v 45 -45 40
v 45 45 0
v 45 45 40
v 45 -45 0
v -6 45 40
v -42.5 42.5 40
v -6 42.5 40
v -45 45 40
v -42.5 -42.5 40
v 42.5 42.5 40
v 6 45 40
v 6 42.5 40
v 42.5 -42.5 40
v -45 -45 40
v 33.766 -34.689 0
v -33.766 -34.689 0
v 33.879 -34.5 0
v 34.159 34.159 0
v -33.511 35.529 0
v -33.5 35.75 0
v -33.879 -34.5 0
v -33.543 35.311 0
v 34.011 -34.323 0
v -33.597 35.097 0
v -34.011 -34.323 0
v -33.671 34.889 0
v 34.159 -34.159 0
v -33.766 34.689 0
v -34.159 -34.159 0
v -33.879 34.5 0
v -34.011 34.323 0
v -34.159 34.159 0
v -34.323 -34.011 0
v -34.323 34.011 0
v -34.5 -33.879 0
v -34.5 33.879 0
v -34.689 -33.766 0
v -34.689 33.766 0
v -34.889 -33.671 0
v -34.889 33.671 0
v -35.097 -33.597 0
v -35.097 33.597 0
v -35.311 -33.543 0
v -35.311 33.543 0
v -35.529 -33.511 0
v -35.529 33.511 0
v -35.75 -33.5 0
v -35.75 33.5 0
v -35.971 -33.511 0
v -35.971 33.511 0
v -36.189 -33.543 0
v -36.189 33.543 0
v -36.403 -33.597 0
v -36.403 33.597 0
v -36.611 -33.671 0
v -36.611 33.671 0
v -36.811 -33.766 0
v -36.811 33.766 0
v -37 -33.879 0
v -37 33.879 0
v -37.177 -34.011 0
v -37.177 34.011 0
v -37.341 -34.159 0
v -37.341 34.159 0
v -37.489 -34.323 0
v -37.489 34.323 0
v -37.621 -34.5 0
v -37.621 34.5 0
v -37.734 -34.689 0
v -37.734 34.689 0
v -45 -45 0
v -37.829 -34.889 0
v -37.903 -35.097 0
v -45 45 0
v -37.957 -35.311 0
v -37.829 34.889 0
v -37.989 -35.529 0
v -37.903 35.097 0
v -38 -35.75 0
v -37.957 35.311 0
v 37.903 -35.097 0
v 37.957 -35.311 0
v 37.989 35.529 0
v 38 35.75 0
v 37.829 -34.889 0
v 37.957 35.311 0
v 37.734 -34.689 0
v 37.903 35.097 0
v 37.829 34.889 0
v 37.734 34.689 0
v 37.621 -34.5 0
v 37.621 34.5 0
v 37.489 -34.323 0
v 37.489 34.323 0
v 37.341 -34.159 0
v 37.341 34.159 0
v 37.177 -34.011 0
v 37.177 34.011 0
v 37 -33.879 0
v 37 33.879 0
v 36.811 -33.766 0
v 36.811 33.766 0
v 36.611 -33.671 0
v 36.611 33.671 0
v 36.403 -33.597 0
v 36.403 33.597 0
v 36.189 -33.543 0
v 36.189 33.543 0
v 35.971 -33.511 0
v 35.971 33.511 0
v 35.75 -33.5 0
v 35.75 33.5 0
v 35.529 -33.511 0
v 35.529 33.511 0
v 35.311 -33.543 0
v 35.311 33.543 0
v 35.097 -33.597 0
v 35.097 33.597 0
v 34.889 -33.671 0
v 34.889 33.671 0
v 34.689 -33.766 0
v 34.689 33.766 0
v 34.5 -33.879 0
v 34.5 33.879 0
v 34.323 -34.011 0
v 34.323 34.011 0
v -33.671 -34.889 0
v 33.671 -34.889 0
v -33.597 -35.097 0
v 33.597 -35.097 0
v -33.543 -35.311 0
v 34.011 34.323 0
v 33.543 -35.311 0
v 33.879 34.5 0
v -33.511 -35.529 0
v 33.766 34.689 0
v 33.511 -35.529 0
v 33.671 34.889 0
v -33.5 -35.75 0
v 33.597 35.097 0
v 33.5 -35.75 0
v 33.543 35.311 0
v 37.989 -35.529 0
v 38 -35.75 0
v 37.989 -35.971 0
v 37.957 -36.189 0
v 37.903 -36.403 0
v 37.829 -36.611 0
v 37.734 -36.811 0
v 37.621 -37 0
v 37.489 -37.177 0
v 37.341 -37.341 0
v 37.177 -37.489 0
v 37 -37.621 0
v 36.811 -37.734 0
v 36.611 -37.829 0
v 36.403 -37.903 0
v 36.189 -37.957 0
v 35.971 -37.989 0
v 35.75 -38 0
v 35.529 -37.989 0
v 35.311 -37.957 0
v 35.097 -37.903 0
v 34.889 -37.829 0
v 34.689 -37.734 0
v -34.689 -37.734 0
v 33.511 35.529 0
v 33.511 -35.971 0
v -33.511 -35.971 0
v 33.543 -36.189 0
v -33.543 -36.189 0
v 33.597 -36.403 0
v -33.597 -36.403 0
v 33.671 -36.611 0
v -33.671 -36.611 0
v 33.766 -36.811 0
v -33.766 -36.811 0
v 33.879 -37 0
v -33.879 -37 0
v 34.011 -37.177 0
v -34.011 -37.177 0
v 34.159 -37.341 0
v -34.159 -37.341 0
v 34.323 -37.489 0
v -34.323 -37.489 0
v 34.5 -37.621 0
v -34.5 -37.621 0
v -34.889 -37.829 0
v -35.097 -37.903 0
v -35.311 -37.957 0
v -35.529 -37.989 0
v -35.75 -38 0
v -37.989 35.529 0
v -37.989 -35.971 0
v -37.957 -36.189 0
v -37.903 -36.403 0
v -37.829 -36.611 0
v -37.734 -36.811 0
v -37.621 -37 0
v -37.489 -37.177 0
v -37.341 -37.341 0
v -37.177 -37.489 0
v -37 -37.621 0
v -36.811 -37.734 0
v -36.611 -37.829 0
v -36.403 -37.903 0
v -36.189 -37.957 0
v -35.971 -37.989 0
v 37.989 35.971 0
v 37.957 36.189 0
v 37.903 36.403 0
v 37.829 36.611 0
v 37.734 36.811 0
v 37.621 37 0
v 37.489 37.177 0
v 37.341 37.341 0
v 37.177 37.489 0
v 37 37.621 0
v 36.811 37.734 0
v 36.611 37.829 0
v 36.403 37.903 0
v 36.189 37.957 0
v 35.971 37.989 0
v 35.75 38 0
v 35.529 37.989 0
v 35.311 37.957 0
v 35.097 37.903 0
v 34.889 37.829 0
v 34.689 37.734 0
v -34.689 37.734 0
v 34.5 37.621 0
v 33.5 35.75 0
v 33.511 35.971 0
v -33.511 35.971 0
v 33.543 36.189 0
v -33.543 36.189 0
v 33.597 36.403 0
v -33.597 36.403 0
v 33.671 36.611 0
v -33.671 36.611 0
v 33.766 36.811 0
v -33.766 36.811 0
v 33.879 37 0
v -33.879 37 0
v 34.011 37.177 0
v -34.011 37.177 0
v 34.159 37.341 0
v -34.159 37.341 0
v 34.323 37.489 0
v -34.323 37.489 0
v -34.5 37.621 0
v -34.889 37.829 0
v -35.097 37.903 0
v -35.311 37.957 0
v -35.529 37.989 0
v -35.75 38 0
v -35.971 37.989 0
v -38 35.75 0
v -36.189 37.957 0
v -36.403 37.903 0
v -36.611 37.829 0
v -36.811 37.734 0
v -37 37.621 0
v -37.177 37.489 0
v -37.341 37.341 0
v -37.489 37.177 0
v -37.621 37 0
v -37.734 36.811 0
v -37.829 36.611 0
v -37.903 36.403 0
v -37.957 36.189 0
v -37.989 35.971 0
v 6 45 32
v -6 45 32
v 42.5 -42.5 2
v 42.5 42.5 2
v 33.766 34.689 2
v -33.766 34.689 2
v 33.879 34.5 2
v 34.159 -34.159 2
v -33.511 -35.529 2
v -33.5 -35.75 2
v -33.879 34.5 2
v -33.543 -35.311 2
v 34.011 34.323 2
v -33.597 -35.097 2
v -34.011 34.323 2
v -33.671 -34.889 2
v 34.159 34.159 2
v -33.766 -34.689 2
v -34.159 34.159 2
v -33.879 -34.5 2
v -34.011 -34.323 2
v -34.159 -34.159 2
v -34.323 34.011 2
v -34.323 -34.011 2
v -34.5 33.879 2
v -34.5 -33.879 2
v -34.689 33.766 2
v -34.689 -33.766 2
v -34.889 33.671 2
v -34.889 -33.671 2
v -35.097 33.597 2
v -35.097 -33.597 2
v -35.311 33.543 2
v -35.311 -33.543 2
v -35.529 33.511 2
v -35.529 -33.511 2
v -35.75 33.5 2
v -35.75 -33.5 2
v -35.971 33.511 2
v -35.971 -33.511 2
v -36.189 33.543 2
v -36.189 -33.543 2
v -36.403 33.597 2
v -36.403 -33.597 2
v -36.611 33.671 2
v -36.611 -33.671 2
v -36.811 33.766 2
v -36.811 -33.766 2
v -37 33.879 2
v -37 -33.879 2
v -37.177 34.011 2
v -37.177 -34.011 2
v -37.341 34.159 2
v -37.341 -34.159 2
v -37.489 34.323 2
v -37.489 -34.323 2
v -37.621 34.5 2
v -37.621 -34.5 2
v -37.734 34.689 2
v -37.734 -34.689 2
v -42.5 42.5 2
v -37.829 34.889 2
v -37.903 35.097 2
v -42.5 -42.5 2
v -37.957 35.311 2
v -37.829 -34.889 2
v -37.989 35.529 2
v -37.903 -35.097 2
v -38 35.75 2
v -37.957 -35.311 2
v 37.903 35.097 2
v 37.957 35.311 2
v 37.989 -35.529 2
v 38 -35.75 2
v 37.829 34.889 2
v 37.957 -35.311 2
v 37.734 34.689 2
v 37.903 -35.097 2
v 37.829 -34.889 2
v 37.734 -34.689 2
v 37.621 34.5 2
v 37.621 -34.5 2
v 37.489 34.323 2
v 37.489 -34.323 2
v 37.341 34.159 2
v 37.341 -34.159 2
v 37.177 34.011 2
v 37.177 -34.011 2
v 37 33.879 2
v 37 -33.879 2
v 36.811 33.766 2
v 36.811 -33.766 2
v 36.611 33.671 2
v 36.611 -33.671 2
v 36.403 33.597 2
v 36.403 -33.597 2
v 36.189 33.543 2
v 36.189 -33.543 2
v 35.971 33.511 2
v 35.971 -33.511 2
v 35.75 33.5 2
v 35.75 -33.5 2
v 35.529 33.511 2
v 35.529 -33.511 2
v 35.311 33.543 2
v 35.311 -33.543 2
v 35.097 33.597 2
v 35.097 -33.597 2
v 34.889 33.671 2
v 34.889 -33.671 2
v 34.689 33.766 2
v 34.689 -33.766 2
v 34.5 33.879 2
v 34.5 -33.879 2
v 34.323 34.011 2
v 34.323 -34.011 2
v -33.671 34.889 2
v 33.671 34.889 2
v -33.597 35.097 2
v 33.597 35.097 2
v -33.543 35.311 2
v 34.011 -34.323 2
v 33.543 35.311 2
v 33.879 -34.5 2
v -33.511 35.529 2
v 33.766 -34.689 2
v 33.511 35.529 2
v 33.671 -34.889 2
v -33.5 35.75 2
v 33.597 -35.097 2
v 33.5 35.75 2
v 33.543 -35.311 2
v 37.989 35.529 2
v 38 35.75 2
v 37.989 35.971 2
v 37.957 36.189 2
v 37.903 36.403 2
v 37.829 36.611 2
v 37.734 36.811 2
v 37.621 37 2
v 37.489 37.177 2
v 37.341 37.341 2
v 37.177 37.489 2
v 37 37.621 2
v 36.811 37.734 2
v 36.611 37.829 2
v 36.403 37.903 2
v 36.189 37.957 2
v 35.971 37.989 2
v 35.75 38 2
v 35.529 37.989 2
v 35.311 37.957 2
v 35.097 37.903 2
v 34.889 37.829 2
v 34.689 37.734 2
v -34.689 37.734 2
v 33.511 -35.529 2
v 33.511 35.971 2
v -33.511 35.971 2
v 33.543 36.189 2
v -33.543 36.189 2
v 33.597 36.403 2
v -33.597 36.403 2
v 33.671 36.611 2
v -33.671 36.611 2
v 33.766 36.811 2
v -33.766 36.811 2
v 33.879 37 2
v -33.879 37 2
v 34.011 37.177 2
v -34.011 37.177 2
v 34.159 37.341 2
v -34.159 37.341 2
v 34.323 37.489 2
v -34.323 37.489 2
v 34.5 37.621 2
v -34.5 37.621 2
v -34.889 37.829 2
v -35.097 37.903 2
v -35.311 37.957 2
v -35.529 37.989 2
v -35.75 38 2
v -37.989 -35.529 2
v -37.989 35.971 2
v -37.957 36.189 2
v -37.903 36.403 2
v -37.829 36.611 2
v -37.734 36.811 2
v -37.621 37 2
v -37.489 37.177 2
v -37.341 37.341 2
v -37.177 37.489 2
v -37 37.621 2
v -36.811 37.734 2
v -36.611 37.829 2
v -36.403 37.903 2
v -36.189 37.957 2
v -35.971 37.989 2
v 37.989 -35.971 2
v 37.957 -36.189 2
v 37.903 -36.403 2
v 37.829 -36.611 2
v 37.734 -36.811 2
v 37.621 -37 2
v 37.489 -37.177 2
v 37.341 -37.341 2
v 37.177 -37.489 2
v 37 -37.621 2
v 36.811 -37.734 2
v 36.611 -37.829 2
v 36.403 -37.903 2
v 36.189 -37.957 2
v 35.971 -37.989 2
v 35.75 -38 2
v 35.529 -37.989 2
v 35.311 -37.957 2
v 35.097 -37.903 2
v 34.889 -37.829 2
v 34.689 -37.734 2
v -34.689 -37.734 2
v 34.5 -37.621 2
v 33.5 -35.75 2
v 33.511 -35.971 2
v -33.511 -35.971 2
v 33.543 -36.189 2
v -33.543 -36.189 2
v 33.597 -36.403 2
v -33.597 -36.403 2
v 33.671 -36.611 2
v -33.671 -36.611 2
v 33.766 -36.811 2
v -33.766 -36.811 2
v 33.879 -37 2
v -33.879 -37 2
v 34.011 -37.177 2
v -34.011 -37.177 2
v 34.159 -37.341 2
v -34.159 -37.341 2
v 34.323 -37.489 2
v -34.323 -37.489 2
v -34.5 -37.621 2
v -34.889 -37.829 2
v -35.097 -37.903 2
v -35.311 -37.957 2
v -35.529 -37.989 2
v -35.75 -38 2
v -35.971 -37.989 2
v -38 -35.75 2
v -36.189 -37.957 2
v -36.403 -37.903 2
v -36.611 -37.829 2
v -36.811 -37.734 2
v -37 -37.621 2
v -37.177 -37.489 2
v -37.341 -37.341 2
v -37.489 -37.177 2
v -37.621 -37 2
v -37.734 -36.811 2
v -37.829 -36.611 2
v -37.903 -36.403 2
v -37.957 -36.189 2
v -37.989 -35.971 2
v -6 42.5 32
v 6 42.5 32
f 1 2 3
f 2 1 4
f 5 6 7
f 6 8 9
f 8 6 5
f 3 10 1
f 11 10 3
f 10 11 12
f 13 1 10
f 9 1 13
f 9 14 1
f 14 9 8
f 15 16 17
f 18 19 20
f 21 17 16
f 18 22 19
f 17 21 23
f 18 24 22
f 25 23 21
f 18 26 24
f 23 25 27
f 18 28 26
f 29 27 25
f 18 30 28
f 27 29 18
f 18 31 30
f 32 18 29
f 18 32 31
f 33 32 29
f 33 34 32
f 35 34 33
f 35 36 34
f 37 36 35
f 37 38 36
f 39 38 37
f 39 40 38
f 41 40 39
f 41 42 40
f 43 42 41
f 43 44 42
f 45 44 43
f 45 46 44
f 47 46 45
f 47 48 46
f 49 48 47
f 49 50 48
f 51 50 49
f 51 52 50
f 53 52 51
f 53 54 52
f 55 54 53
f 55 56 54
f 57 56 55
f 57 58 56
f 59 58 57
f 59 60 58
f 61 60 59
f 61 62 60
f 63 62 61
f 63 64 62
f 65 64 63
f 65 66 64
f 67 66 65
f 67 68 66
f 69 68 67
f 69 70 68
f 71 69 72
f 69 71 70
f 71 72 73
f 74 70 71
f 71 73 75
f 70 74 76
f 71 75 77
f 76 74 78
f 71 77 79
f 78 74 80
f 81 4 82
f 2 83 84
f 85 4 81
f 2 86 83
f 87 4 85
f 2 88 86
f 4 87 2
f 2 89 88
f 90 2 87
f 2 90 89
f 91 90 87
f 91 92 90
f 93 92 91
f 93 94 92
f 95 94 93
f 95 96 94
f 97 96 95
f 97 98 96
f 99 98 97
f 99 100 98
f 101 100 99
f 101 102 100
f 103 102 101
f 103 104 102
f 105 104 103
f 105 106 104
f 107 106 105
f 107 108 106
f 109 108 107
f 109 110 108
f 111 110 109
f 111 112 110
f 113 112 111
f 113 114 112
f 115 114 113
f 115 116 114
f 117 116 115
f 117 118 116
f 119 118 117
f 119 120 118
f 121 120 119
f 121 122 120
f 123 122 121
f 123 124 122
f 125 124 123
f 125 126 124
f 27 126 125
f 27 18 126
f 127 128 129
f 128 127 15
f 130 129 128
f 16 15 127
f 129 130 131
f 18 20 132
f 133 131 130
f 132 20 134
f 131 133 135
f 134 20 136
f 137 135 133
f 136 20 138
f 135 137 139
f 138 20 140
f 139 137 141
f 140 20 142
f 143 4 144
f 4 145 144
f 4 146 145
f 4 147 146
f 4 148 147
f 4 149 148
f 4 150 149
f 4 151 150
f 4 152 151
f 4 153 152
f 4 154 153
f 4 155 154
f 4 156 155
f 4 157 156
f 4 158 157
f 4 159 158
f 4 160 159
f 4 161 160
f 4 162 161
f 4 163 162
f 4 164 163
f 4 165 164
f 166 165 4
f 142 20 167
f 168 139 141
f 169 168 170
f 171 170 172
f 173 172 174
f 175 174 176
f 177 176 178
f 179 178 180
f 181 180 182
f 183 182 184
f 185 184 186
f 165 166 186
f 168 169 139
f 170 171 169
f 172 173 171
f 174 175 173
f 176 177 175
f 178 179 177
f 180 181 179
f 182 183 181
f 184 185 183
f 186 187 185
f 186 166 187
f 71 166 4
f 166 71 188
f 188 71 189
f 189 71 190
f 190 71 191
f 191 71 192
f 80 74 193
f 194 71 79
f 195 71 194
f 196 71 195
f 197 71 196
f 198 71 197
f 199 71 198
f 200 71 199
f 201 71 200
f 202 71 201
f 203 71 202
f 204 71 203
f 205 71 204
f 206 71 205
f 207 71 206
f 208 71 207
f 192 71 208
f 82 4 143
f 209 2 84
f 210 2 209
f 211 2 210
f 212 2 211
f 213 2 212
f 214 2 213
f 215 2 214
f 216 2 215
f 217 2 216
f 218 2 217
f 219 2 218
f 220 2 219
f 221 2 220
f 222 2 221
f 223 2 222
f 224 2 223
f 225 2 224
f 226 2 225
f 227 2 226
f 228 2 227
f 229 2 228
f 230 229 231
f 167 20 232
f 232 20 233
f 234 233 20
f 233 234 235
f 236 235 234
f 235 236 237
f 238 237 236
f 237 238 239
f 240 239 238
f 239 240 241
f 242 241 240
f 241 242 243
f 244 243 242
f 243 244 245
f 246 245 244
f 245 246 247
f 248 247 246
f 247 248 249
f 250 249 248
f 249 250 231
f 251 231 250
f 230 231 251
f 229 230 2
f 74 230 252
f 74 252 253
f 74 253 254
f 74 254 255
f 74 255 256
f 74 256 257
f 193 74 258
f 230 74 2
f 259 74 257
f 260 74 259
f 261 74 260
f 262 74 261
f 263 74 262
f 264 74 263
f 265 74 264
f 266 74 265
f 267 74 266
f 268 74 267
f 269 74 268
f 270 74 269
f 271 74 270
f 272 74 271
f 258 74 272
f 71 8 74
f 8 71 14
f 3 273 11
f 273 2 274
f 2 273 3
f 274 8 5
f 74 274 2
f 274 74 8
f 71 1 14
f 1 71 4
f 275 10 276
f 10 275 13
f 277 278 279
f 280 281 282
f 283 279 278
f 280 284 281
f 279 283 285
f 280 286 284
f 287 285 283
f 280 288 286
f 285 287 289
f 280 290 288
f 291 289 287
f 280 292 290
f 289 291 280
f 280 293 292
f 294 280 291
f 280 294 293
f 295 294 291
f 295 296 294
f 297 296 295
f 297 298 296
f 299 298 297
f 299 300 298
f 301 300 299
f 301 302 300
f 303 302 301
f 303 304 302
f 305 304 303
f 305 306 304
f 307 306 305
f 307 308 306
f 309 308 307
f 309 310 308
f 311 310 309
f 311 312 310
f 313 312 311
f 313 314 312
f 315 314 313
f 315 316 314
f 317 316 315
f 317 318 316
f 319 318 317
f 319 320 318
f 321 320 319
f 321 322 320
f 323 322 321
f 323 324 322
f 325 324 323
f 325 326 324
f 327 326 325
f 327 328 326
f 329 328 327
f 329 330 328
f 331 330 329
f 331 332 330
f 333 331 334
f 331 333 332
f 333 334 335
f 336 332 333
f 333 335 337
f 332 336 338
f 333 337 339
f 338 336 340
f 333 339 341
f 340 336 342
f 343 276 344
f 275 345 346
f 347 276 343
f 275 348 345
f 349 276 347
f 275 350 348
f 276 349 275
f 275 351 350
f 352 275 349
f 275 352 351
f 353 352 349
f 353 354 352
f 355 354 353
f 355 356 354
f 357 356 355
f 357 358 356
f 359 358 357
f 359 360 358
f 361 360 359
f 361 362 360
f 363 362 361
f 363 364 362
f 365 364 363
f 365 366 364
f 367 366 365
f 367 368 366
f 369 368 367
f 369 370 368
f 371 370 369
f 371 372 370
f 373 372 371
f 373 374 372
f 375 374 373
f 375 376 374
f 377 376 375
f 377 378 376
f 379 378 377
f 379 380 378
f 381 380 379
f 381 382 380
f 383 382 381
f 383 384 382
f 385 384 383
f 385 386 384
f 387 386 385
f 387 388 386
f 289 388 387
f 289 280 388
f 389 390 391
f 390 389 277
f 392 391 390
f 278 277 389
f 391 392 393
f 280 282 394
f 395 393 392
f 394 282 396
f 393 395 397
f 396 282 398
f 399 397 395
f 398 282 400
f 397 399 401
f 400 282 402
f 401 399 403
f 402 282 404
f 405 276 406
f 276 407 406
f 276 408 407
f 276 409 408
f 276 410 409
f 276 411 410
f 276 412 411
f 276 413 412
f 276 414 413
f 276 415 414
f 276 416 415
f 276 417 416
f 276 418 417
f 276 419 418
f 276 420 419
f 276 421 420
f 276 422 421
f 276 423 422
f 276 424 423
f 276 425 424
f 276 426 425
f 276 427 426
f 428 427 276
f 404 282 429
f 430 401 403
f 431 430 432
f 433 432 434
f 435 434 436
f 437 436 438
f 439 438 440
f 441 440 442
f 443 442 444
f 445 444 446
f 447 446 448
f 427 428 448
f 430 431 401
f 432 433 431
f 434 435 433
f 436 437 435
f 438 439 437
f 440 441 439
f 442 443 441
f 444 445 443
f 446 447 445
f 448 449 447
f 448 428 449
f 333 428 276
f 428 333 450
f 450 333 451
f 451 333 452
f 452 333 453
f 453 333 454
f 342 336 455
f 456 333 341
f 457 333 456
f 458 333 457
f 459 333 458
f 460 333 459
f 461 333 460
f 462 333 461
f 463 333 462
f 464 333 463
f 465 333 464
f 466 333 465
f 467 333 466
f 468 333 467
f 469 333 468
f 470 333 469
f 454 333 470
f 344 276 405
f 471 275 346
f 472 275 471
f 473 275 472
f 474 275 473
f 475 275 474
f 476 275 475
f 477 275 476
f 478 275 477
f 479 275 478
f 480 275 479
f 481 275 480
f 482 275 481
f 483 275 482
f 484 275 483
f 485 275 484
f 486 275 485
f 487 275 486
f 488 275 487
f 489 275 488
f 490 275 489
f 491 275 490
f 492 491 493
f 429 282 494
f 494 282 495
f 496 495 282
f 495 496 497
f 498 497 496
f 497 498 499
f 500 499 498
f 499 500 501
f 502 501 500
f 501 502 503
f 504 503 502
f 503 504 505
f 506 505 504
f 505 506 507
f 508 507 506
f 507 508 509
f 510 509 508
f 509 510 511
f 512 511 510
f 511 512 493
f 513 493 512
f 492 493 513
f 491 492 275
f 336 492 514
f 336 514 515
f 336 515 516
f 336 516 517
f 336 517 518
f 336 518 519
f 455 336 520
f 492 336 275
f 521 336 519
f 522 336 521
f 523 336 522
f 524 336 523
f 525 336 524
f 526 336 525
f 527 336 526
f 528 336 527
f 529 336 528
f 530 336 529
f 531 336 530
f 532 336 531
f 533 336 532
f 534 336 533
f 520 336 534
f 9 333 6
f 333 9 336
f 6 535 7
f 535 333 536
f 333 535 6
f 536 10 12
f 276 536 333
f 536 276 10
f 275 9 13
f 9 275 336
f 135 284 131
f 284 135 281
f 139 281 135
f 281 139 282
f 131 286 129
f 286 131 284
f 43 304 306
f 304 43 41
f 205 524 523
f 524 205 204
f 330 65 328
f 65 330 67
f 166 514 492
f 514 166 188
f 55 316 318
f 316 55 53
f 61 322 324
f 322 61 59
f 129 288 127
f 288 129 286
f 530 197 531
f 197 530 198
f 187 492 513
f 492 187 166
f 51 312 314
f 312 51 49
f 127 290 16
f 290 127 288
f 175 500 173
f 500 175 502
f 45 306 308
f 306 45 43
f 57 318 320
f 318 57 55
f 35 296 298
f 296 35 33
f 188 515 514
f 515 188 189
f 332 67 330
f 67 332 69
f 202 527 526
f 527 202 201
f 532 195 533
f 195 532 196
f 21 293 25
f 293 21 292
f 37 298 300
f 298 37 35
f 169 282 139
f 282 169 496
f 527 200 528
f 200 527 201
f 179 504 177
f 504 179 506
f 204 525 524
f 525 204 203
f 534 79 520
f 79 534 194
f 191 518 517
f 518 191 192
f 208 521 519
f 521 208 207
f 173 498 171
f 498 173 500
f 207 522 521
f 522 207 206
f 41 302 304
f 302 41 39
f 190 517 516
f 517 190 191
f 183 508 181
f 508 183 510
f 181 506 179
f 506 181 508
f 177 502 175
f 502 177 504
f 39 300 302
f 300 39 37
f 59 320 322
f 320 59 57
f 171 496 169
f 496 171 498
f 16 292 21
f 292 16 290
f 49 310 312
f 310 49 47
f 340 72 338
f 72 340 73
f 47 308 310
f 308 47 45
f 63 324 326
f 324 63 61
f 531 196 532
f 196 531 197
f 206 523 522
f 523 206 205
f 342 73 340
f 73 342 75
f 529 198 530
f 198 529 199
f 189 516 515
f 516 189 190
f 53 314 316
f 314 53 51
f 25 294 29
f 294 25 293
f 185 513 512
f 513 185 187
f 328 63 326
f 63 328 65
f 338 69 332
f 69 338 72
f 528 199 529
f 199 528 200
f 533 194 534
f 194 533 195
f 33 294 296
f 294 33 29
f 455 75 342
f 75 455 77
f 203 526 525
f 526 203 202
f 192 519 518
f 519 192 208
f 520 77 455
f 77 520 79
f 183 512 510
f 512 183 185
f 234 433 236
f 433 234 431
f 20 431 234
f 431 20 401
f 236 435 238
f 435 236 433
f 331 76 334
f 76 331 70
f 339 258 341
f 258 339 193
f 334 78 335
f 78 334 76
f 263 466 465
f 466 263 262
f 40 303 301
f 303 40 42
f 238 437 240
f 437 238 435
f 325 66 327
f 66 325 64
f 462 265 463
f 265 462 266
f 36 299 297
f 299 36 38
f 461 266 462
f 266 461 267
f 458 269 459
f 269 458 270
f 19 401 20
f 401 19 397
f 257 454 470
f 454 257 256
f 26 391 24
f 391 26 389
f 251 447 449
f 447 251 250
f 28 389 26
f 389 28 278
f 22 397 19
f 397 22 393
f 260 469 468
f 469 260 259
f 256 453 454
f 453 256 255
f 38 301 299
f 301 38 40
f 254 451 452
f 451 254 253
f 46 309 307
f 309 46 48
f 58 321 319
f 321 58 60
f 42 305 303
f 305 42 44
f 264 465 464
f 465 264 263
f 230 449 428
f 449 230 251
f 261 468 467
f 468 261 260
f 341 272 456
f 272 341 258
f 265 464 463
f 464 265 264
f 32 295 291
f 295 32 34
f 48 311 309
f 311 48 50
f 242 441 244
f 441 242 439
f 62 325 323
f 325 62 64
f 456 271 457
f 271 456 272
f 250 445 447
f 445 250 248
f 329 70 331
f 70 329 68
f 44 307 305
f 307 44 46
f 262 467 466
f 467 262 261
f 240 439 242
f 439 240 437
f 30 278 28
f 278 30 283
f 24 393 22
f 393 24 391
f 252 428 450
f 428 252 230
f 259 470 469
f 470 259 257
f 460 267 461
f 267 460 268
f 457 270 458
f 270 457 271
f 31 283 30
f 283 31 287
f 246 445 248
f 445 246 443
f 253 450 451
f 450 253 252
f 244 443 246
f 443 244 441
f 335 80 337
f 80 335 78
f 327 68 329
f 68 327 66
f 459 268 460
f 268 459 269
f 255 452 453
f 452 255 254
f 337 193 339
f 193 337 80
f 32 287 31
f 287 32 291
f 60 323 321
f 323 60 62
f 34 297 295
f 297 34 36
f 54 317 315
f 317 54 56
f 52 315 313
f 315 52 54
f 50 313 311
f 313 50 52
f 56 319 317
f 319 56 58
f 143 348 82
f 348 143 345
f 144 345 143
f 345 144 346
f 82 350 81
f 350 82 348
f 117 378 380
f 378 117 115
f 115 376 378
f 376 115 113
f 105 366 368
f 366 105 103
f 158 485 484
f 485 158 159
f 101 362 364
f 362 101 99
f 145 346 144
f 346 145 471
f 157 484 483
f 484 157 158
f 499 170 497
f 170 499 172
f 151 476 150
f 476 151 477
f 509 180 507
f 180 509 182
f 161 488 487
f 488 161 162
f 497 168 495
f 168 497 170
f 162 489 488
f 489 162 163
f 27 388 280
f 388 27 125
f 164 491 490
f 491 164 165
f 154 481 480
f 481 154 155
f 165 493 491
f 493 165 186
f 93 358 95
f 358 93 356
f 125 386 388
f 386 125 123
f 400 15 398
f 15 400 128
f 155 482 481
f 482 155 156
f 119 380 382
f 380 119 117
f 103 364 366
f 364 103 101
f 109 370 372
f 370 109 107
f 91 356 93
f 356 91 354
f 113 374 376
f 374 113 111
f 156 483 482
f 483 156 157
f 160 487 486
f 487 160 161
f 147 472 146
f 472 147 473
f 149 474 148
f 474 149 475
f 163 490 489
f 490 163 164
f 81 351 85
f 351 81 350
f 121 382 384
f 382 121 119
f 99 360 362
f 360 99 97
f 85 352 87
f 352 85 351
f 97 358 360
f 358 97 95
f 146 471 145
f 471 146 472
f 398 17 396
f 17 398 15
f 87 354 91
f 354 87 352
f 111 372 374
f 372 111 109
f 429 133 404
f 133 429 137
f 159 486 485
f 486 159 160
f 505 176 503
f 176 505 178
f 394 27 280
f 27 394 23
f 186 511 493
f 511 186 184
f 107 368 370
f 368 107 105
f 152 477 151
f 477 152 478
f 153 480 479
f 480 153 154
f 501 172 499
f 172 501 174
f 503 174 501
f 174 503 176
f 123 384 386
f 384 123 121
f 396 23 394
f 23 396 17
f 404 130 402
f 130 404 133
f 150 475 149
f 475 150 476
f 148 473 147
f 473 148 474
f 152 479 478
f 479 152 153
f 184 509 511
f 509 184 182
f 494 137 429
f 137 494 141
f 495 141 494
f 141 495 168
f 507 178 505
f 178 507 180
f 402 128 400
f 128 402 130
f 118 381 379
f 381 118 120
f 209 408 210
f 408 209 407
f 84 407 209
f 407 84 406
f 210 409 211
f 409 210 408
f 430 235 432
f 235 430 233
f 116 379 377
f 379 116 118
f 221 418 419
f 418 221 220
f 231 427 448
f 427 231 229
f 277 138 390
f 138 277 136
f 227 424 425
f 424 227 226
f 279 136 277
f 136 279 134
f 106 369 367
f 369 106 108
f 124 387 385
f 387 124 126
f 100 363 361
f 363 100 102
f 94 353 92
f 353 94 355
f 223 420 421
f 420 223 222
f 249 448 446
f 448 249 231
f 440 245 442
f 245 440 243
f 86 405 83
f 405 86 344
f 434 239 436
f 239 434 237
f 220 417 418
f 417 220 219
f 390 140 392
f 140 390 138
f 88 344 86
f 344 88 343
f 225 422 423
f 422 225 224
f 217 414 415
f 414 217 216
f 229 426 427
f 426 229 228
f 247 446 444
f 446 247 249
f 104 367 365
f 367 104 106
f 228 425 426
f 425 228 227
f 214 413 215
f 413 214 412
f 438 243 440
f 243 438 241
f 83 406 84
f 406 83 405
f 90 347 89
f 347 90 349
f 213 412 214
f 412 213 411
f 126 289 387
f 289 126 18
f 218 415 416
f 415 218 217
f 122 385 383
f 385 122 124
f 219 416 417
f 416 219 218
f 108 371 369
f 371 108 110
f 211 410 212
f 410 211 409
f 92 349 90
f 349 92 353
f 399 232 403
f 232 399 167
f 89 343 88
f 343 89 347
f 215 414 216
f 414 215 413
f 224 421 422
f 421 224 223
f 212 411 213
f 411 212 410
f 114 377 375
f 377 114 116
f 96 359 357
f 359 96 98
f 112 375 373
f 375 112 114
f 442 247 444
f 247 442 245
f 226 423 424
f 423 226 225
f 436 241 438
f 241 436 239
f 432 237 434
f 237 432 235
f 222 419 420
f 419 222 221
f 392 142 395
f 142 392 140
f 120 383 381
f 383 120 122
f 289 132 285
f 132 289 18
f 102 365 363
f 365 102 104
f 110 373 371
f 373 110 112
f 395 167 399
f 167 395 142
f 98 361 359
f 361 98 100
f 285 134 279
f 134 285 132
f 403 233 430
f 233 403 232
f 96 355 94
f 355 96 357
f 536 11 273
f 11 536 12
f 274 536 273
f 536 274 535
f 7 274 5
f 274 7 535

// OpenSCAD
// DIY magnetic stirrer housing (print orientation: upside down)
$fn = 64;

box_x = 90;          // outer size X
box_y = 90;          // outer size Y
box_h = 40;          // total height
top_t = 2;           // top plate thickness
wall_t = 2.5;        // wall thickness
hole_d = 4.5;        // M4 screw hole diameter
hole_pitch = 71.5;   // square hole pattern spacing
notch_w = 12;        // cable notch width
notch_h = 8;         // cable notch depth from open edge

difference() {
    union() {
        // top plate
        translate([-box_x/2, -box_y/2, 0])
            cube([box_x, box_y, top_t]);
        // walls
        difference() {
            translate([-box_x/2, -box_y/2, 0])
                cube([box_x, box_y, box_h]);
            translate([-box_x/2 + wall_t, -box_y/2 + wall_t, top_t])
                cube([box_x - 2*wall_t, box_y - 2*wall_t, box_h]);
        }
    }

    // fan mounting holes
    for (sx = [-1, 1], sy = [-1, 1])
        translate([sx*hole_pitch/2, sy*hole_pitch/2, -1])
            cylinder(d = hole_d, h = top_t + 2);

    // cable notch in the +Y wall
    translate([-notch_w/2, box_y/2 - wall_t - 1, box_h - notch_h])
        cube([notch_w, wall_t + 2, notch_h + 1]);
}
